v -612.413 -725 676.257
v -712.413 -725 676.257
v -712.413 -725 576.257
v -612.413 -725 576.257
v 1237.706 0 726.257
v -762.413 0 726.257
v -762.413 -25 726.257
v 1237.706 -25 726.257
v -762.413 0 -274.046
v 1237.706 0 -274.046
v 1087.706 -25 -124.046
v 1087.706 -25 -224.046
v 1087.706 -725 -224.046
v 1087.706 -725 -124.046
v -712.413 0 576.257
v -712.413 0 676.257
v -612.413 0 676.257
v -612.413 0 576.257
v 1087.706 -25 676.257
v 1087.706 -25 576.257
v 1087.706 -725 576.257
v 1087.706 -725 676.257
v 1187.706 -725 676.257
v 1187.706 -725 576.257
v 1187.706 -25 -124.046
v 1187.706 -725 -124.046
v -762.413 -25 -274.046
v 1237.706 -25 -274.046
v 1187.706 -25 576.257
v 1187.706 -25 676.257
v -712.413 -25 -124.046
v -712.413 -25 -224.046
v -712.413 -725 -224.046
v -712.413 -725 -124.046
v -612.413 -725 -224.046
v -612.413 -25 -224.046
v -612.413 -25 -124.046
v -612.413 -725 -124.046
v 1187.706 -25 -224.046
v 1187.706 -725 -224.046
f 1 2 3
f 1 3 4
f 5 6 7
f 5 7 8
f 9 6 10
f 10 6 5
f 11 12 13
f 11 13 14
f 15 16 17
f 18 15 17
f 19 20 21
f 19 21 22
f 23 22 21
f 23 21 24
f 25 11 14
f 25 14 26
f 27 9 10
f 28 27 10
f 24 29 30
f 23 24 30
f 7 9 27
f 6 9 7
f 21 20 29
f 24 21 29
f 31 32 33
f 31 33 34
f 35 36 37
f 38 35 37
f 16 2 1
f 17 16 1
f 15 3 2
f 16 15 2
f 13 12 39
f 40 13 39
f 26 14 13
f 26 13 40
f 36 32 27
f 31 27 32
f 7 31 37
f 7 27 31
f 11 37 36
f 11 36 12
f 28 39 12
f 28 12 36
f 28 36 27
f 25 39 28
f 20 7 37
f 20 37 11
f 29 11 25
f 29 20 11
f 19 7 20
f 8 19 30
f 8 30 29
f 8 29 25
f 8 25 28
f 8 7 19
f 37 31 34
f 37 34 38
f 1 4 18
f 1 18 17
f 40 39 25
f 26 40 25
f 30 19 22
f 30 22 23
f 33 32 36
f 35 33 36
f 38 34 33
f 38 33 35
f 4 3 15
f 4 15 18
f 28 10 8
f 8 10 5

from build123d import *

# Parameters (mm, degrees)
F0_W     = 2000.11918
F0_H     = 1000.30308
F1_DEPTH = 25
F2_W     = 100
F2_H     = 100
F3_DEPTH = 725
F4_W     = 100
F4_H     = 100
F5_DEPTH = 725
F6_W     = 100
F6_H     = 100
F7_DEPTH = 725
F8_W     = 100
F8_H     = 100
F9_DEPTH = 725


with BuildPart() as f1:
    # F0 (on Front) → F1 (new body)
    with BuildSketch(Plane.XZ):
        with Locations((237.646327, 226.105506)):
            Rectangle(F0_W, F0_H)
    extrude(amount=F1_DEPTH)

    # F2 (on Front) → F3 (join)
    with BuildSketch(Plane.XZ):
        with Locations((-662.413263, -174.046034)):
            Rectangle(F2_W, F2_H)
    extrude(amount=F3_DEPTH)

    # F4 (on Front) → F5 (join)
    with BuildSketch(Plane.XZ):
        with Locations((1137.705917, 626.257046)):
            Rectangle(F4_W, F4_H)
    extrude(amount=F5_DEPTH)

    # F8 (on Front) → F9 (join)
    with BuildSketch(Plane.XZ):
        with Locations((1137.705917, -174.046034)):
            Rectangle(F8_W, F8_H)
    extrude(amount=F9_DEPTH)


with BuildPart() as f7:
    # F6 (on Front) → F7 (new body)
    with BuildSketch(Plane.XZ):
        with Locations((-662.413263, 626.257046)):
            Rectangle(F6_W, F6_H)
    extrude(amount=F7_DEPTH)


solid = Compound([f1.part, f7.part])
